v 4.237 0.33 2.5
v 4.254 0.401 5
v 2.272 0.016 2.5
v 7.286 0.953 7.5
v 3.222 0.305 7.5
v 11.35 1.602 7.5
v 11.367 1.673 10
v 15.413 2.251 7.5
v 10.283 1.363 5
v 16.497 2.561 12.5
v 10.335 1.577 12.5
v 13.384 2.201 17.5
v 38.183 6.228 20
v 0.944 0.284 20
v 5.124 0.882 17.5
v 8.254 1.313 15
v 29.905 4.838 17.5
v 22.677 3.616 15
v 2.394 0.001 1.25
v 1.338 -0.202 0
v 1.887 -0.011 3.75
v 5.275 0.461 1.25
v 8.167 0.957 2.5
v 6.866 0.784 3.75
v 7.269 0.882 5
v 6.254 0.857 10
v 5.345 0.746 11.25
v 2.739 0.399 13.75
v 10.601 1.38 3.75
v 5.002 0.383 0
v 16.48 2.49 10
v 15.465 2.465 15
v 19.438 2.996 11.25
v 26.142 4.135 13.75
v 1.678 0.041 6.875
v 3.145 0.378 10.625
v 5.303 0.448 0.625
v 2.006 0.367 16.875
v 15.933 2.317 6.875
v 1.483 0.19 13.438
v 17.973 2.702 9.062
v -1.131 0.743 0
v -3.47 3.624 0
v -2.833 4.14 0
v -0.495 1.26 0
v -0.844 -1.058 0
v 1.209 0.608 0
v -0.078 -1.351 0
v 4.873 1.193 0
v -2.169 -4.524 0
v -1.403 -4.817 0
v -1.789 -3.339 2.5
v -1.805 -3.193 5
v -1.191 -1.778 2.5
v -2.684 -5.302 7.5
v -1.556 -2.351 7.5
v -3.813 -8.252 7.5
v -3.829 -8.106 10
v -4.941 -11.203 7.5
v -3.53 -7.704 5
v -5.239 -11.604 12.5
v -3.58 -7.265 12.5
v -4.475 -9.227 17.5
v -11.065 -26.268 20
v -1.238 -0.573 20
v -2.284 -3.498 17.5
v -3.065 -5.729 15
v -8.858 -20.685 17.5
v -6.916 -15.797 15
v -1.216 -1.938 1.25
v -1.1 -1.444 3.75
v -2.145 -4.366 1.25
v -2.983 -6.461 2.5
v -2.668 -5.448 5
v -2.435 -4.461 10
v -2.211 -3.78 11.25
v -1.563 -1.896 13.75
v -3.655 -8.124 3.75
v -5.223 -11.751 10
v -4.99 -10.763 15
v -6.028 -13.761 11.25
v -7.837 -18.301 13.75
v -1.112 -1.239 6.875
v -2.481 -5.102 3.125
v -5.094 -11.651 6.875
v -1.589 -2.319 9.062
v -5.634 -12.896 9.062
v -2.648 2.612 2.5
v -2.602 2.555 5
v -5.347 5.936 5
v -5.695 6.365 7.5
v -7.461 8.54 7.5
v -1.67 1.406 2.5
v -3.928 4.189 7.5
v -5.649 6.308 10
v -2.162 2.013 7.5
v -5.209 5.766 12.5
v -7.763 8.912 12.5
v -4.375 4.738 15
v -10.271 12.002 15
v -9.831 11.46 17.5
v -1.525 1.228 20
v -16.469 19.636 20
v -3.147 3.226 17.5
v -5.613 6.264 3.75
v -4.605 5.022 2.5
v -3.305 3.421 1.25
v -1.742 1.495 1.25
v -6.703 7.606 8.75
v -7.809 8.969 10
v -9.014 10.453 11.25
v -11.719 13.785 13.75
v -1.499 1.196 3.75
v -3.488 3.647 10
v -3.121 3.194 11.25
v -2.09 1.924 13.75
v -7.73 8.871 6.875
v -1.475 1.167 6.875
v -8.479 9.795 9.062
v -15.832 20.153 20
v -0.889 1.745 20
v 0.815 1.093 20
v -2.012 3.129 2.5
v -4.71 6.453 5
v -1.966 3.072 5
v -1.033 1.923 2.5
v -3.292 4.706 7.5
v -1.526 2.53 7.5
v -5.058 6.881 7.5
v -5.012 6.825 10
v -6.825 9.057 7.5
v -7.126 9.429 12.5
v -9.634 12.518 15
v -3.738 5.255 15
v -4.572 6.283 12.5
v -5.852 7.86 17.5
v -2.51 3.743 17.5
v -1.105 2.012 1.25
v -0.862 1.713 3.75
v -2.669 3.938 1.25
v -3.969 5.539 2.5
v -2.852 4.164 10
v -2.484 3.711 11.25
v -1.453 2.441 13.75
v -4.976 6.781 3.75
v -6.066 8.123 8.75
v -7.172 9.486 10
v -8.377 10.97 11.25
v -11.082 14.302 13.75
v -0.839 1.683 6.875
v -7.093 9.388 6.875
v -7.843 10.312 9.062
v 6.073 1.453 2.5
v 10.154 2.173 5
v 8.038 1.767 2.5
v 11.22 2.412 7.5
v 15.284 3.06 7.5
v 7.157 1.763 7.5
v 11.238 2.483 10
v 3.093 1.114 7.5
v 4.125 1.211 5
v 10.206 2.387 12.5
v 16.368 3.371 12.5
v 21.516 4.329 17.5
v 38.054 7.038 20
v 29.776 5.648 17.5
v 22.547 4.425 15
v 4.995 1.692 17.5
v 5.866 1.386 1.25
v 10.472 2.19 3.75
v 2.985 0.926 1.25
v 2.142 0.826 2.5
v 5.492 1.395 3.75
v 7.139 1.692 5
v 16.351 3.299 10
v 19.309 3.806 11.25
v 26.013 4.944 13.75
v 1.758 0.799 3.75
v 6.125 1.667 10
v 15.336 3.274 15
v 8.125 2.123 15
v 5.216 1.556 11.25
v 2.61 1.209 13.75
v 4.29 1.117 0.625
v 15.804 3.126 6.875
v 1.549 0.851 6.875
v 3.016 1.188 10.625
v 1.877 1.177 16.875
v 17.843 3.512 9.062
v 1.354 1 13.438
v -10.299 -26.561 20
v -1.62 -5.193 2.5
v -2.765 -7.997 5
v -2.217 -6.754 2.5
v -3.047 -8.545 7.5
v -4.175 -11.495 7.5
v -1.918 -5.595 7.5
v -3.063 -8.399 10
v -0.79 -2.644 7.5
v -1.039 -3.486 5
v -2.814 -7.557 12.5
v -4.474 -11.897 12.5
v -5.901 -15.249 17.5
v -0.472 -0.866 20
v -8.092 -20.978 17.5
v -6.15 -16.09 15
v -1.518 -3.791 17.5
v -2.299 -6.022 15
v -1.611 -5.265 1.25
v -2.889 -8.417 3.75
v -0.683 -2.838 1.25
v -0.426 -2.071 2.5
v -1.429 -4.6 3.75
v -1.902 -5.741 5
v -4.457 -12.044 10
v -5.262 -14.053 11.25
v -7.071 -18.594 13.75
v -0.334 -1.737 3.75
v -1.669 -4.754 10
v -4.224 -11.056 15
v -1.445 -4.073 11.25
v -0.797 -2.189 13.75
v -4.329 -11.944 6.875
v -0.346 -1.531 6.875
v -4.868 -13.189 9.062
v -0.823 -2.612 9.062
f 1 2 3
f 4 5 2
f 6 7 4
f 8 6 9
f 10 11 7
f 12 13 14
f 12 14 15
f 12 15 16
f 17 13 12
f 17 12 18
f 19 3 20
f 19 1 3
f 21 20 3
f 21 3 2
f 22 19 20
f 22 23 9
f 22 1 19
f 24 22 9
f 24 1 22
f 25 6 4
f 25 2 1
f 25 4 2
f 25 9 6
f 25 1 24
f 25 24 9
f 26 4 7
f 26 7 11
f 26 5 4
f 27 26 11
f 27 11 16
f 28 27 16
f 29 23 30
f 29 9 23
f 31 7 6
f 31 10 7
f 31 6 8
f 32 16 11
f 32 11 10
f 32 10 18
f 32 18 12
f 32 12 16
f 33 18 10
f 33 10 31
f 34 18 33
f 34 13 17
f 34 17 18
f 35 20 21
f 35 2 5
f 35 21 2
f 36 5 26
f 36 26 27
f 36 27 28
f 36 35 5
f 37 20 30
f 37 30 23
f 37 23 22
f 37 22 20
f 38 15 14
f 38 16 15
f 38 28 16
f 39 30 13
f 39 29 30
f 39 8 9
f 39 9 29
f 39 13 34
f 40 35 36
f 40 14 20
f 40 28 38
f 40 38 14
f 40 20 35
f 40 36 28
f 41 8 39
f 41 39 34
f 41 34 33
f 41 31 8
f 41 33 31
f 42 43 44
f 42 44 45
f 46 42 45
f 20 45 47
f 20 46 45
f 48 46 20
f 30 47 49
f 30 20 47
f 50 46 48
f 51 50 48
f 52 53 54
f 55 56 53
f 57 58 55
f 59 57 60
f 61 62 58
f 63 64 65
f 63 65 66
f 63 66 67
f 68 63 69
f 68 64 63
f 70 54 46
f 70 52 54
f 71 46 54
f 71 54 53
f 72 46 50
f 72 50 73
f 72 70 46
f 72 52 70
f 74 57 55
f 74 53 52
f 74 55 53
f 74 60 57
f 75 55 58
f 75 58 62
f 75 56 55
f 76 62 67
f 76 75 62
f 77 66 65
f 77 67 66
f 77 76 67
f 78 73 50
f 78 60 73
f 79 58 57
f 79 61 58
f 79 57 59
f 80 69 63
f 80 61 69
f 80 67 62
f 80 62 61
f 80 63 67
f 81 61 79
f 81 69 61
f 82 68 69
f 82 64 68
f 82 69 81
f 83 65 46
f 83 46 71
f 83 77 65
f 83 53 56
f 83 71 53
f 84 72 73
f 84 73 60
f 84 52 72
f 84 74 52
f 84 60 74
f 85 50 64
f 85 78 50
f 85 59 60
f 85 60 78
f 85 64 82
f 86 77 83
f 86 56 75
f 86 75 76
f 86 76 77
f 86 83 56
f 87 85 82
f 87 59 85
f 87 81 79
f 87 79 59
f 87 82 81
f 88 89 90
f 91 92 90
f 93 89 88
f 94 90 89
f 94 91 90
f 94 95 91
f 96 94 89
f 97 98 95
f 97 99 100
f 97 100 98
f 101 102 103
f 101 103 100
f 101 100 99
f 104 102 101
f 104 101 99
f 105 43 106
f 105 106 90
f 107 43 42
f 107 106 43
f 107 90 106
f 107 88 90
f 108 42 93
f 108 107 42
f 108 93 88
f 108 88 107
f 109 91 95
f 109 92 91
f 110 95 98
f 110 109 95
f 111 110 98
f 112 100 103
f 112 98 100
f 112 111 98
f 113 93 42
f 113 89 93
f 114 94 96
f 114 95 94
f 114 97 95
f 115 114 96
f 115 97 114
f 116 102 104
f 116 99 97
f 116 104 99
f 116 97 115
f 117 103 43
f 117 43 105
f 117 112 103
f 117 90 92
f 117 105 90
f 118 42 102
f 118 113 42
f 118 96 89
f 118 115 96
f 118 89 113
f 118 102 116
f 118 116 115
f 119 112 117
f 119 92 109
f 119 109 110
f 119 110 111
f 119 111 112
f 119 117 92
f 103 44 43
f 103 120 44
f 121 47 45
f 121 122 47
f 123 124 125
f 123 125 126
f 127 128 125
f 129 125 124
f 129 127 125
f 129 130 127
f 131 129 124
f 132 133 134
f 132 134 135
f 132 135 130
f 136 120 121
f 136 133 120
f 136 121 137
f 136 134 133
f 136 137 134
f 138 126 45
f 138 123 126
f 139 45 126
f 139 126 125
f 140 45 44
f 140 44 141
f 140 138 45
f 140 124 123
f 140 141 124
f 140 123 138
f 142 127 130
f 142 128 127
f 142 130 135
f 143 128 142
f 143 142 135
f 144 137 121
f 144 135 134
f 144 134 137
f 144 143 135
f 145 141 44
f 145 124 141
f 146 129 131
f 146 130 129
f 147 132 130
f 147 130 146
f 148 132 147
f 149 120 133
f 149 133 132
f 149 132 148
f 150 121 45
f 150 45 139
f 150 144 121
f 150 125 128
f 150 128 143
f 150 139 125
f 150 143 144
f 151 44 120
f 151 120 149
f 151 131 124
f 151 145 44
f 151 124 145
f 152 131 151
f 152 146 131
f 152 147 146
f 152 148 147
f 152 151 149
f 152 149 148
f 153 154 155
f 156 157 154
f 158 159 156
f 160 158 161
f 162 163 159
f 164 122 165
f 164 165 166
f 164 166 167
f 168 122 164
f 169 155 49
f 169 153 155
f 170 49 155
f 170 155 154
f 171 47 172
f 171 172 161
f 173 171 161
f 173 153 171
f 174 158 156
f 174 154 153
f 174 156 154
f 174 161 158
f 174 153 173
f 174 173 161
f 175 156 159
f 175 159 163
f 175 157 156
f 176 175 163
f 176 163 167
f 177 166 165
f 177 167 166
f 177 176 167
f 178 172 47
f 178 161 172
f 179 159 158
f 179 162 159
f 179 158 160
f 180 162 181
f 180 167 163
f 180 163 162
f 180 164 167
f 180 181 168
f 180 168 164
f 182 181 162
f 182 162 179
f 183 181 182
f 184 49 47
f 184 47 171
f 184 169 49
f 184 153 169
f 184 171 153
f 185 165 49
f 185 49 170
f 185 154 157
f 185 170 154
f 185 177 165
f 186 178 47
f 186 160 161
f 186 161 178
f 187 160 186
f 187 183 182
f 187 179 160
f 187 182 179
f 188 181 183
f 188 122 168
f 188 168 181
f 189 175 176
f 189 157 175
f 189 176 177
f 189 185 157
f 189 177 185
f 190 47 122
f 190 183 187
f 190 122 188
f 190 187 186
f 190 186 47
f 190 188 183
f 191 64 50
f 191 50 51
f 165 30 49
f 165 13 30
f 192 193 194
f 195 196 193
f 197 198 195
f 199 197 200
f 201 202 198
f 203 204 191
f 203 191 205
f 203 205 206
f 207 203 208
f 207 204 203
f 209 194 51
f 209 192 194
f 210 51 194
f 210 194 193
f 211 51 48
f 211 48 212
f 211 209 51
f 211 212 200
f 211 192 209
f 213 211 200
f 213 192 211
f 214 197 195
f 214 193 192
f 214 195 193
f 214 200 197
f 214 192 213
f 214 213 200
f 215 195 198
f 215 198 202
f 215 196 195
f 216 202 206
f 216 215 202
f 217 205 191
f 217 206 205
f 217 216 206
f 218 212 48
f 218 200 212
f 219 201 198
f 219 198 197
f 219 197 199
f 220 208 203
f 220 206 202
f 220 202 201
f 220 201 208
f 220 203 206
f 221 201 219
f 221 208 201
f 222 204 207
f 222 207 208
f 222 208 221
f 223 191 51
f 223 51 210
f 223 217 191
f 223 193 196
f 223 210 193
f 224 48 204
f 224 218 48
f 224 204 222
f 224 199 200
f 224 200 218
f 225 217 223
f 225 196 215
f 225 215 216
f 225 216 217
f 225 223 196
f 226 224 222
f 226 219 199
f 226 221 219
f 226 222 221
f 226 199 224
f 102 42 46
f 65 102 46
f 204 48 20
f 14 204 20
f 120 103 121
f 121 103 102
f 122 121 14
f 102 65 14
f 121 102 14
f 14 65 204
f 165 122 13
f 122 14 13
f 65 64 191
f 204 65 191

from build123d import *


with BuildPart() as f3:
    # F0 (on Top) → F3 section 0
    with BuildSketch(Plane.XY):
        Polygon((-3.46963, 3.623502), (-1.131267, 0.743016), (-0.843729, -1.058281), (-2.169121, -4.523606), (-1.403229, -4.816539), (-0.077837, -1.351214), (1.338362, -0.20155), (5.002119, 0.383289), (4.87286, 1.193037), (1.209104, 0.608198), (-0.494634, 1.259831), (-2.832997, 4.140317), align=None)
    # F2 (on offset) → F3 section 1
    with BuildSketch(Plane.XY.offset(20)):
        Polygon((-16.468799, 19.636379), (-1.525181, 1.228254), (-1.237643, -0.573042), (-11.065231, -26.267913), (-10.299339, -26.560845), (-0.471751, -0.865975), (0.944448, 0.283688), (38.183131, 6.228036), (38.053872, 7.037784), (0.81519, 1.093437), (-0.888548, 1.74507), (-15.832166, 20.153194), align=None)
    loft()


solid = f3.part
